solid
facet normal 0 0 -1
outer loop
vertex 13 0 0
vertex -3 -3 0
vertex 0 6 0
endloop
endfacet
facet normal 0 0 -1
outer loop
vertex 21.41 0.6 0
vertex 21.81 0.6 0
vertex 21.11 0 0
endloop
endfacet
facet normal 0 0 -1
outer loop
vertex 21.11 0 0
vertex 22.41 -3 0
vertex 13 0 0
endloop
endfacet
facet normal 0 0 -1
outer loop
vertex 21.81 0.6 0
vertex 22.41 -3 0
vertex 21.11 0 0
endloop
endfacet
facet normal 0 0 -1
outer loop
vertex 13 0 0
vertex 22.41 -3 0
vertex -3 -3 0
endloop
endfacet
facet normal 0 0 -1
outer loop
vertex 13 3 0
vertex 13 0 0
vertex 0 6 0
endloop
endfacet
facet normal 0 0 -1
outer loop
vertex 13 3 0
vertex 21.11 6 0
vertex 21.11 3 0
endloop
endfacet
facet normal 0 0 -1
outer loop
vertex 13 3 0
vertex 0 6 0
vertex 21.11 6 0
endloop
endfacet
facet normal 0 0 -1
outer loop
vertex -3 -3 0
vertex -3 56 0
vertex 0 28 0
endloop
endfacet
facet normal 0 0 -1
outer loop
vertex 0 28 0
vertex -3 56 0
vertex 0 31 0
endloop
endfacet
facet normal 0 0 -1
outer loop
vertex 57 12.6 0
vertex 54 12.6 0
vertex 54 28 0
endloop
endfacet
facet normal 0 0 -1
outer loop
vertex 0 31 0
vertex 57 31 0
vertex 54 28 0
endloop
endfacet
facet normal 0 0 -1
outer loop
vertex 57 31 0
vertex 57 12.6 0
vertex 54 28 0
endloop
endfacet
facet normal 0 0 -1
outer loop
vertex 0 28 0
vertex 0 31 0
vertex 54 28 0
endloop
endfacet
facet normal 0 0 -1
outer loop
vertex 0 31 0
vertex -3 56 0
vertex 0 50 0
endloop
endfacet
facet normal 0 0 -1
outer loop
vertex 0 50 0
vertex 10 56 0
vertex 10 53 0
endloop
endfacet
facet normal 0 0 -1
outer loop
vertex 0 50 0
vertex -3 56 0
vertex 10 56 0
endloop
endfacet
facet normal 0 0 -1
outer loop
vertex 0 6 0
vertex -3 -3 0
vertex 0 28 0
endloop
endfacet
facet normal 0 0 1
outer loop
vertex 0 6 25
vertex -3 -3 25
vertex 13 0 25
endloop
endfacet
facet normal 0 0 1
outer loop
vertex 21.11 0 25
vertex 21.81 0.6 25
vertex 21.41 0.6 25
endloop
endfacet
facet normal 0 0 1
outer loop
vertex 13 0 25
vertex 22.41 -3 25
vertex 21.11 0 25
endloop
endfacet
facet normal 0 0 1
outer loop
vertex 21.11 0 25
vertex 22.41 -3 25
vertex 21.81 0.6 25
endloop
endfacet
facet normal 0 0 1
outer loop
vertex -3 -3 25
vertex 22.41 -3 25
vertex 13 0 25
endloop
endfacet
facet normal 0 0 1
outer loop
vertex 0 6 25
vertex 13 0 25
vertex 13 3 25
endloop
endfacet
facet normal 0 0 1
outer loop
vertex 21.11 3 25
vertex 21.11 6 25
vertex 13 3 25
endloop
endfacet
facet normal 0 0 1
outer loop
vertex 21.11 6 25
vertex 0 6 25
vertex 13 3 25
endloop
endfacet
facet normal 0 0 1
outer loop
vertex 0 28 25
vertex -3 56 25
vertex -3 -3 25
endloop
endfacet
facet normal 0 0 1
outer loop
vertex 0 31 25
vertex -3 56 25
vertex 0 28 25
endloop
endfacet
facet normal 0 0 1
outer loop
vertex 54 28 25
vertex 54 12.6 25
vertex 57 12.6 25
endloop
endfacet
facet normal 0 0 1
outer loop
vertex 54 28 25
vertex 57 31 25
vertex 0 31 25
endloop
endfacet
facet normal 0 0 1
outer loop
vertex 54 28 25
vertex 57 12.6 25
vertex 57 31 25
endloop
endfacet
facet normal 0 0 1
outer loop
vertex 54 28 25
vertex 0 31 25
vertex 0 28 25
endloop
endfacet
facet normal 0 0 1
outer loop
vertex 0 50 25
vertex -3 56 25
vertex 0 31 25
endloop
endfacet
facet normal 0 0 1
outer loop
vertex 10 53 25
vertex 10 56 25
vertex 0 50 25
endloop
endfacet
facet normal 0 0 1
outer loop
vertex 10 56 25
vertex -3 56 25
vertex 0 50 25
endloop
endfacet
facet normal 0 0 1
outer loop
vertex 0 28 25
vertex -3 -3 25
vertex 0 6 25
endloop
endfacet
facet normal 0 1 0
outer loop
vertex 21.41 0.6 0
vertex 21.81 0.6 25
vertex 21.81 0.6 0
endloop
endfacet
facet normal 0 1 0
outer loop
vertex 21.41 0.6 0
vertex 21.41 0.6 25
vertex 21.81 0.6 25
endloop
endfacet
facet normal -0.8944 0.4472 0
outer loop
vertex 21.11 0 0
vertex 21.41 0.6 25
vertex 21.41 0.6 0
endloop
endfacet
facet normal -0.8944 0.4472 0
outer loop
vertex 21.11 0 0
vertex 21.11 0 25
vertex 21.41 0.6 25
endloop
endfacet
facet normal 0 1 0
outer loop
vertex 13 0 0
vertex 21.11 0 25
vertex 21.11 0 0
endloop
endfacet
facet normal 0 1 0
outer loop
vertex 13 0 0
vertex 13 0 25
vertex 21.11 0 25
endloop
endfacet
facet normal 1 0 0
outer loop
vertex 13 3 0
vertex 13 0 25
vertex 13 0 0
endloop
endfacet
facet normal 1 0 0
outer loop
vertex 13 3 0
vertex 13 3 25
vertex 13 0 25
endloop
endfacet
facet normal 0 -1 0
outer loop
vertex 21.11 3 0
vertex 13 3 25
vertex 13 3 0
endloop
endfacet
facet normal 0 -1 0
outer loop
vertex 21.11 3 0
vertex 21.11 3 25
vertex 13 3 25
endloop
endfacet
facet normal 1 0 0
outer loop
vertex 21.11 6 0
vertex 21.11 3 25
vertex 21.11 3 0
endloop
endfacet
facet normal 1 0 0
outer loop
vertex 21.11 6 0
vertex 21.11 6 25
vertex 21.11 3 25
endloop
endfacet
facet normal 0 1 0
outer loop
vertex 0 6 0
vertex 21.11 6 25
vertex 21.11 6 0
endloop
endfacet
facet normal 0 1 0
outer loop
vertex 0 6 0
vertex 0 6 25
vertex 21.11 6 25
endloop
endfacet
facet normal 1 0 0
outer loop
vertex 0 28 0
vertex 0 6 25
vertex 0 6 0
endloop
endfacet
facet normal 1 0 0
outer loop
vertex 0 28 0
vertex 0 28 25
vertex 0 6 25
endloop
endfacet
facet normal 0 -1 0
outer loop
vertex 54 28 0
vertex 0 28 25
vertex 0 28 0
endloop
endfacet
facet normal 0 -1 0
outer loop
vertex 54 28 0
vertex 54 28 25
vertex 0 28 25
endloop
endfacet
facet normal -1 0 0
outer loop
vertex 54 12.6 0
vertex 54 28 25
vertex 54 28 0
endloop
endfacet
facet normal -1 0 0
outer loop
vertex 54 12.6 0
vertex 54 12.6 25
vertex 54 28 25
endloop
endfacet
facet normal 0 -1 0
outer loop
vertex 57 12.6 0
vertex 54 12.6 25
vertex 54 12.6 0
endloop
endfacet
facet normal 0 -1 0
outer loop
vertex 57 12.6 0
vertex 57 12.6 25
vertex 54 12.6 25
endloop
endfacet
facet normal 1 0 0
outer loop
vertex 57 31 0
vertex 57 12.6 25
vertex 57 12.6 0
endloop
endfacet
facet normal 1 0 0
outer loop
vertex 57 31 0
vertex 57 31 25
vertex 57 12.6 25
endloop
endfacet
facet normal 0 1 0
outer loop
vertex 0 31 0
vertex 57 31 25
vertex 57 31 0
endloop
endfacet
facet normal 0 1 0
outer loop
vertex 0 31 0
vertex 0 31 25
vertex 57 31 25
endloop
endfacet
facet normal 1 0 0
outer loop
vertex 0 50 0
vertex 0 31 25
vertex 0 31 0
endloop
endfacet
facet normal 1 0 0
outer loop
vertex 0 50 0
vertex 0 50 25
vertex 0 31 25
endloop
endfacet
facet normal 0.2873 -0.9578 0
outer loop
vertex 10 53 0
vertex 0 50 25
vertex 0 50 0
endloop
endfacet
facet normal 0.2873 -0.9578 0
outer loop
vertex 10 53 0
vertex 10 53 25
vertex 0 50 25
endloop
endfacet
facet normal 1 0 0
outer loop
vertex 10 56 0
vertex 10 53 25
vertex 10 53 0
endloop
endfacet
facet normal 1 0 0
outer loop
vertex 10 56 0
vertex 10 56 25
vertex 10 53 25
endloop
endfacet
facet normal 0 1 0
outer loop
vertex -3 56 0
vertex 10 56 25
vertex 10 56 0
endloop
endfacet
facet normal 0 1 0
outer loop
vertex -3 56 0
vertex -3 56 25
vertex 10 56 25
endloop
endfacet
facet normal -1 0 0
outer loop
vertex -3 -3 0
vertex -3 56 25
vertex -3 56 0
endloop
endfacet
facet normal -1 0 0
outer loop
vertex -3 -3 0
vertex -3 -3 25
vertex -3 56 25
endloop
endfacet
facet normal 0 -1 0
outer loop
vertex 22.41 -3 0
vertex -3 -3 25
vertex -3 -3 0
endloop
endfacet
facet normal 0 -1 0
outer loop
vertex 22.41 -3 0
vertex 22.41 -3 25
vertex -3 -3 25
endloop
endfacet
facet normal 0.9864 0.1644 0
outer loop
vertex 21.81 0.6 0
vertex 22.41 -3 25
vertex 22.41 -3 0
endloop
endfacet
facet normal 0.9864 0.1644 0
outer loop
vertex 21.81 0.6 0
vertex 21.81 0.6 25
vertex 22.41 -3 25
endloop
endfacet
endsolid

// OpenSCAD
mountingThickness = 3.0;
boardToBoardSpacing = 30.0;
connectorDepth = 25;
pegHeight = 1;
pegToothHeight = 0.3;
pegOverlap = 0.6;
boardMountingWidth = 8.11;
batteryHeight = 22;
batteryLength = 54;
footHeight = 25;
footSize = 10;

th = 3;
smh = boardMountingWidth;
mth = mountingThickness;

pth = pegToothHeight;
ph = pegHeight;
po = pegOverlap;

o = 13;

linear_extrude(height = connectorDepth) {

    polygon(points = [
        [ -th, -th ],
        [ smh + pth + ph+o, -th ],
        [ smh + pth + max(ph / 3, 0.4)+o, 0 + po ],
        [ smh + pth+o, 0 + po ],
        [ smh+o, 0 ],
        [ 0+o, 0 ],
        [ 0+o, mth ],
        [ smh+o, mth ],
        [ smh+o, mth + th ],
        [ 0, mth + th ],
        [ 0, mth + th + batteryHeight ],
        [ batteryLength, mth + th + batteryHeight ],
        [ batteryLength, mth + th + batteryHeight * 0.3 ],
        [ batteryLength + th, mth + th + batteryHeight * 0.3 ],
        [ batteryLength + th, mth + th + batteryHeight + th ],
        [ 0, mth + th + batteryHeight + th ],
        [ 0, mth + th + batteryHeight + th + footHeight - th * 2 ],
        [ footSize, mth + th + batteryHeight + th + footHeight - th ],
        [ footSize, mth + th + batteryHeight + th + footHeight ],
        [ -th, mth + th + batteryHeight + th + footHeight ] ]);

};
